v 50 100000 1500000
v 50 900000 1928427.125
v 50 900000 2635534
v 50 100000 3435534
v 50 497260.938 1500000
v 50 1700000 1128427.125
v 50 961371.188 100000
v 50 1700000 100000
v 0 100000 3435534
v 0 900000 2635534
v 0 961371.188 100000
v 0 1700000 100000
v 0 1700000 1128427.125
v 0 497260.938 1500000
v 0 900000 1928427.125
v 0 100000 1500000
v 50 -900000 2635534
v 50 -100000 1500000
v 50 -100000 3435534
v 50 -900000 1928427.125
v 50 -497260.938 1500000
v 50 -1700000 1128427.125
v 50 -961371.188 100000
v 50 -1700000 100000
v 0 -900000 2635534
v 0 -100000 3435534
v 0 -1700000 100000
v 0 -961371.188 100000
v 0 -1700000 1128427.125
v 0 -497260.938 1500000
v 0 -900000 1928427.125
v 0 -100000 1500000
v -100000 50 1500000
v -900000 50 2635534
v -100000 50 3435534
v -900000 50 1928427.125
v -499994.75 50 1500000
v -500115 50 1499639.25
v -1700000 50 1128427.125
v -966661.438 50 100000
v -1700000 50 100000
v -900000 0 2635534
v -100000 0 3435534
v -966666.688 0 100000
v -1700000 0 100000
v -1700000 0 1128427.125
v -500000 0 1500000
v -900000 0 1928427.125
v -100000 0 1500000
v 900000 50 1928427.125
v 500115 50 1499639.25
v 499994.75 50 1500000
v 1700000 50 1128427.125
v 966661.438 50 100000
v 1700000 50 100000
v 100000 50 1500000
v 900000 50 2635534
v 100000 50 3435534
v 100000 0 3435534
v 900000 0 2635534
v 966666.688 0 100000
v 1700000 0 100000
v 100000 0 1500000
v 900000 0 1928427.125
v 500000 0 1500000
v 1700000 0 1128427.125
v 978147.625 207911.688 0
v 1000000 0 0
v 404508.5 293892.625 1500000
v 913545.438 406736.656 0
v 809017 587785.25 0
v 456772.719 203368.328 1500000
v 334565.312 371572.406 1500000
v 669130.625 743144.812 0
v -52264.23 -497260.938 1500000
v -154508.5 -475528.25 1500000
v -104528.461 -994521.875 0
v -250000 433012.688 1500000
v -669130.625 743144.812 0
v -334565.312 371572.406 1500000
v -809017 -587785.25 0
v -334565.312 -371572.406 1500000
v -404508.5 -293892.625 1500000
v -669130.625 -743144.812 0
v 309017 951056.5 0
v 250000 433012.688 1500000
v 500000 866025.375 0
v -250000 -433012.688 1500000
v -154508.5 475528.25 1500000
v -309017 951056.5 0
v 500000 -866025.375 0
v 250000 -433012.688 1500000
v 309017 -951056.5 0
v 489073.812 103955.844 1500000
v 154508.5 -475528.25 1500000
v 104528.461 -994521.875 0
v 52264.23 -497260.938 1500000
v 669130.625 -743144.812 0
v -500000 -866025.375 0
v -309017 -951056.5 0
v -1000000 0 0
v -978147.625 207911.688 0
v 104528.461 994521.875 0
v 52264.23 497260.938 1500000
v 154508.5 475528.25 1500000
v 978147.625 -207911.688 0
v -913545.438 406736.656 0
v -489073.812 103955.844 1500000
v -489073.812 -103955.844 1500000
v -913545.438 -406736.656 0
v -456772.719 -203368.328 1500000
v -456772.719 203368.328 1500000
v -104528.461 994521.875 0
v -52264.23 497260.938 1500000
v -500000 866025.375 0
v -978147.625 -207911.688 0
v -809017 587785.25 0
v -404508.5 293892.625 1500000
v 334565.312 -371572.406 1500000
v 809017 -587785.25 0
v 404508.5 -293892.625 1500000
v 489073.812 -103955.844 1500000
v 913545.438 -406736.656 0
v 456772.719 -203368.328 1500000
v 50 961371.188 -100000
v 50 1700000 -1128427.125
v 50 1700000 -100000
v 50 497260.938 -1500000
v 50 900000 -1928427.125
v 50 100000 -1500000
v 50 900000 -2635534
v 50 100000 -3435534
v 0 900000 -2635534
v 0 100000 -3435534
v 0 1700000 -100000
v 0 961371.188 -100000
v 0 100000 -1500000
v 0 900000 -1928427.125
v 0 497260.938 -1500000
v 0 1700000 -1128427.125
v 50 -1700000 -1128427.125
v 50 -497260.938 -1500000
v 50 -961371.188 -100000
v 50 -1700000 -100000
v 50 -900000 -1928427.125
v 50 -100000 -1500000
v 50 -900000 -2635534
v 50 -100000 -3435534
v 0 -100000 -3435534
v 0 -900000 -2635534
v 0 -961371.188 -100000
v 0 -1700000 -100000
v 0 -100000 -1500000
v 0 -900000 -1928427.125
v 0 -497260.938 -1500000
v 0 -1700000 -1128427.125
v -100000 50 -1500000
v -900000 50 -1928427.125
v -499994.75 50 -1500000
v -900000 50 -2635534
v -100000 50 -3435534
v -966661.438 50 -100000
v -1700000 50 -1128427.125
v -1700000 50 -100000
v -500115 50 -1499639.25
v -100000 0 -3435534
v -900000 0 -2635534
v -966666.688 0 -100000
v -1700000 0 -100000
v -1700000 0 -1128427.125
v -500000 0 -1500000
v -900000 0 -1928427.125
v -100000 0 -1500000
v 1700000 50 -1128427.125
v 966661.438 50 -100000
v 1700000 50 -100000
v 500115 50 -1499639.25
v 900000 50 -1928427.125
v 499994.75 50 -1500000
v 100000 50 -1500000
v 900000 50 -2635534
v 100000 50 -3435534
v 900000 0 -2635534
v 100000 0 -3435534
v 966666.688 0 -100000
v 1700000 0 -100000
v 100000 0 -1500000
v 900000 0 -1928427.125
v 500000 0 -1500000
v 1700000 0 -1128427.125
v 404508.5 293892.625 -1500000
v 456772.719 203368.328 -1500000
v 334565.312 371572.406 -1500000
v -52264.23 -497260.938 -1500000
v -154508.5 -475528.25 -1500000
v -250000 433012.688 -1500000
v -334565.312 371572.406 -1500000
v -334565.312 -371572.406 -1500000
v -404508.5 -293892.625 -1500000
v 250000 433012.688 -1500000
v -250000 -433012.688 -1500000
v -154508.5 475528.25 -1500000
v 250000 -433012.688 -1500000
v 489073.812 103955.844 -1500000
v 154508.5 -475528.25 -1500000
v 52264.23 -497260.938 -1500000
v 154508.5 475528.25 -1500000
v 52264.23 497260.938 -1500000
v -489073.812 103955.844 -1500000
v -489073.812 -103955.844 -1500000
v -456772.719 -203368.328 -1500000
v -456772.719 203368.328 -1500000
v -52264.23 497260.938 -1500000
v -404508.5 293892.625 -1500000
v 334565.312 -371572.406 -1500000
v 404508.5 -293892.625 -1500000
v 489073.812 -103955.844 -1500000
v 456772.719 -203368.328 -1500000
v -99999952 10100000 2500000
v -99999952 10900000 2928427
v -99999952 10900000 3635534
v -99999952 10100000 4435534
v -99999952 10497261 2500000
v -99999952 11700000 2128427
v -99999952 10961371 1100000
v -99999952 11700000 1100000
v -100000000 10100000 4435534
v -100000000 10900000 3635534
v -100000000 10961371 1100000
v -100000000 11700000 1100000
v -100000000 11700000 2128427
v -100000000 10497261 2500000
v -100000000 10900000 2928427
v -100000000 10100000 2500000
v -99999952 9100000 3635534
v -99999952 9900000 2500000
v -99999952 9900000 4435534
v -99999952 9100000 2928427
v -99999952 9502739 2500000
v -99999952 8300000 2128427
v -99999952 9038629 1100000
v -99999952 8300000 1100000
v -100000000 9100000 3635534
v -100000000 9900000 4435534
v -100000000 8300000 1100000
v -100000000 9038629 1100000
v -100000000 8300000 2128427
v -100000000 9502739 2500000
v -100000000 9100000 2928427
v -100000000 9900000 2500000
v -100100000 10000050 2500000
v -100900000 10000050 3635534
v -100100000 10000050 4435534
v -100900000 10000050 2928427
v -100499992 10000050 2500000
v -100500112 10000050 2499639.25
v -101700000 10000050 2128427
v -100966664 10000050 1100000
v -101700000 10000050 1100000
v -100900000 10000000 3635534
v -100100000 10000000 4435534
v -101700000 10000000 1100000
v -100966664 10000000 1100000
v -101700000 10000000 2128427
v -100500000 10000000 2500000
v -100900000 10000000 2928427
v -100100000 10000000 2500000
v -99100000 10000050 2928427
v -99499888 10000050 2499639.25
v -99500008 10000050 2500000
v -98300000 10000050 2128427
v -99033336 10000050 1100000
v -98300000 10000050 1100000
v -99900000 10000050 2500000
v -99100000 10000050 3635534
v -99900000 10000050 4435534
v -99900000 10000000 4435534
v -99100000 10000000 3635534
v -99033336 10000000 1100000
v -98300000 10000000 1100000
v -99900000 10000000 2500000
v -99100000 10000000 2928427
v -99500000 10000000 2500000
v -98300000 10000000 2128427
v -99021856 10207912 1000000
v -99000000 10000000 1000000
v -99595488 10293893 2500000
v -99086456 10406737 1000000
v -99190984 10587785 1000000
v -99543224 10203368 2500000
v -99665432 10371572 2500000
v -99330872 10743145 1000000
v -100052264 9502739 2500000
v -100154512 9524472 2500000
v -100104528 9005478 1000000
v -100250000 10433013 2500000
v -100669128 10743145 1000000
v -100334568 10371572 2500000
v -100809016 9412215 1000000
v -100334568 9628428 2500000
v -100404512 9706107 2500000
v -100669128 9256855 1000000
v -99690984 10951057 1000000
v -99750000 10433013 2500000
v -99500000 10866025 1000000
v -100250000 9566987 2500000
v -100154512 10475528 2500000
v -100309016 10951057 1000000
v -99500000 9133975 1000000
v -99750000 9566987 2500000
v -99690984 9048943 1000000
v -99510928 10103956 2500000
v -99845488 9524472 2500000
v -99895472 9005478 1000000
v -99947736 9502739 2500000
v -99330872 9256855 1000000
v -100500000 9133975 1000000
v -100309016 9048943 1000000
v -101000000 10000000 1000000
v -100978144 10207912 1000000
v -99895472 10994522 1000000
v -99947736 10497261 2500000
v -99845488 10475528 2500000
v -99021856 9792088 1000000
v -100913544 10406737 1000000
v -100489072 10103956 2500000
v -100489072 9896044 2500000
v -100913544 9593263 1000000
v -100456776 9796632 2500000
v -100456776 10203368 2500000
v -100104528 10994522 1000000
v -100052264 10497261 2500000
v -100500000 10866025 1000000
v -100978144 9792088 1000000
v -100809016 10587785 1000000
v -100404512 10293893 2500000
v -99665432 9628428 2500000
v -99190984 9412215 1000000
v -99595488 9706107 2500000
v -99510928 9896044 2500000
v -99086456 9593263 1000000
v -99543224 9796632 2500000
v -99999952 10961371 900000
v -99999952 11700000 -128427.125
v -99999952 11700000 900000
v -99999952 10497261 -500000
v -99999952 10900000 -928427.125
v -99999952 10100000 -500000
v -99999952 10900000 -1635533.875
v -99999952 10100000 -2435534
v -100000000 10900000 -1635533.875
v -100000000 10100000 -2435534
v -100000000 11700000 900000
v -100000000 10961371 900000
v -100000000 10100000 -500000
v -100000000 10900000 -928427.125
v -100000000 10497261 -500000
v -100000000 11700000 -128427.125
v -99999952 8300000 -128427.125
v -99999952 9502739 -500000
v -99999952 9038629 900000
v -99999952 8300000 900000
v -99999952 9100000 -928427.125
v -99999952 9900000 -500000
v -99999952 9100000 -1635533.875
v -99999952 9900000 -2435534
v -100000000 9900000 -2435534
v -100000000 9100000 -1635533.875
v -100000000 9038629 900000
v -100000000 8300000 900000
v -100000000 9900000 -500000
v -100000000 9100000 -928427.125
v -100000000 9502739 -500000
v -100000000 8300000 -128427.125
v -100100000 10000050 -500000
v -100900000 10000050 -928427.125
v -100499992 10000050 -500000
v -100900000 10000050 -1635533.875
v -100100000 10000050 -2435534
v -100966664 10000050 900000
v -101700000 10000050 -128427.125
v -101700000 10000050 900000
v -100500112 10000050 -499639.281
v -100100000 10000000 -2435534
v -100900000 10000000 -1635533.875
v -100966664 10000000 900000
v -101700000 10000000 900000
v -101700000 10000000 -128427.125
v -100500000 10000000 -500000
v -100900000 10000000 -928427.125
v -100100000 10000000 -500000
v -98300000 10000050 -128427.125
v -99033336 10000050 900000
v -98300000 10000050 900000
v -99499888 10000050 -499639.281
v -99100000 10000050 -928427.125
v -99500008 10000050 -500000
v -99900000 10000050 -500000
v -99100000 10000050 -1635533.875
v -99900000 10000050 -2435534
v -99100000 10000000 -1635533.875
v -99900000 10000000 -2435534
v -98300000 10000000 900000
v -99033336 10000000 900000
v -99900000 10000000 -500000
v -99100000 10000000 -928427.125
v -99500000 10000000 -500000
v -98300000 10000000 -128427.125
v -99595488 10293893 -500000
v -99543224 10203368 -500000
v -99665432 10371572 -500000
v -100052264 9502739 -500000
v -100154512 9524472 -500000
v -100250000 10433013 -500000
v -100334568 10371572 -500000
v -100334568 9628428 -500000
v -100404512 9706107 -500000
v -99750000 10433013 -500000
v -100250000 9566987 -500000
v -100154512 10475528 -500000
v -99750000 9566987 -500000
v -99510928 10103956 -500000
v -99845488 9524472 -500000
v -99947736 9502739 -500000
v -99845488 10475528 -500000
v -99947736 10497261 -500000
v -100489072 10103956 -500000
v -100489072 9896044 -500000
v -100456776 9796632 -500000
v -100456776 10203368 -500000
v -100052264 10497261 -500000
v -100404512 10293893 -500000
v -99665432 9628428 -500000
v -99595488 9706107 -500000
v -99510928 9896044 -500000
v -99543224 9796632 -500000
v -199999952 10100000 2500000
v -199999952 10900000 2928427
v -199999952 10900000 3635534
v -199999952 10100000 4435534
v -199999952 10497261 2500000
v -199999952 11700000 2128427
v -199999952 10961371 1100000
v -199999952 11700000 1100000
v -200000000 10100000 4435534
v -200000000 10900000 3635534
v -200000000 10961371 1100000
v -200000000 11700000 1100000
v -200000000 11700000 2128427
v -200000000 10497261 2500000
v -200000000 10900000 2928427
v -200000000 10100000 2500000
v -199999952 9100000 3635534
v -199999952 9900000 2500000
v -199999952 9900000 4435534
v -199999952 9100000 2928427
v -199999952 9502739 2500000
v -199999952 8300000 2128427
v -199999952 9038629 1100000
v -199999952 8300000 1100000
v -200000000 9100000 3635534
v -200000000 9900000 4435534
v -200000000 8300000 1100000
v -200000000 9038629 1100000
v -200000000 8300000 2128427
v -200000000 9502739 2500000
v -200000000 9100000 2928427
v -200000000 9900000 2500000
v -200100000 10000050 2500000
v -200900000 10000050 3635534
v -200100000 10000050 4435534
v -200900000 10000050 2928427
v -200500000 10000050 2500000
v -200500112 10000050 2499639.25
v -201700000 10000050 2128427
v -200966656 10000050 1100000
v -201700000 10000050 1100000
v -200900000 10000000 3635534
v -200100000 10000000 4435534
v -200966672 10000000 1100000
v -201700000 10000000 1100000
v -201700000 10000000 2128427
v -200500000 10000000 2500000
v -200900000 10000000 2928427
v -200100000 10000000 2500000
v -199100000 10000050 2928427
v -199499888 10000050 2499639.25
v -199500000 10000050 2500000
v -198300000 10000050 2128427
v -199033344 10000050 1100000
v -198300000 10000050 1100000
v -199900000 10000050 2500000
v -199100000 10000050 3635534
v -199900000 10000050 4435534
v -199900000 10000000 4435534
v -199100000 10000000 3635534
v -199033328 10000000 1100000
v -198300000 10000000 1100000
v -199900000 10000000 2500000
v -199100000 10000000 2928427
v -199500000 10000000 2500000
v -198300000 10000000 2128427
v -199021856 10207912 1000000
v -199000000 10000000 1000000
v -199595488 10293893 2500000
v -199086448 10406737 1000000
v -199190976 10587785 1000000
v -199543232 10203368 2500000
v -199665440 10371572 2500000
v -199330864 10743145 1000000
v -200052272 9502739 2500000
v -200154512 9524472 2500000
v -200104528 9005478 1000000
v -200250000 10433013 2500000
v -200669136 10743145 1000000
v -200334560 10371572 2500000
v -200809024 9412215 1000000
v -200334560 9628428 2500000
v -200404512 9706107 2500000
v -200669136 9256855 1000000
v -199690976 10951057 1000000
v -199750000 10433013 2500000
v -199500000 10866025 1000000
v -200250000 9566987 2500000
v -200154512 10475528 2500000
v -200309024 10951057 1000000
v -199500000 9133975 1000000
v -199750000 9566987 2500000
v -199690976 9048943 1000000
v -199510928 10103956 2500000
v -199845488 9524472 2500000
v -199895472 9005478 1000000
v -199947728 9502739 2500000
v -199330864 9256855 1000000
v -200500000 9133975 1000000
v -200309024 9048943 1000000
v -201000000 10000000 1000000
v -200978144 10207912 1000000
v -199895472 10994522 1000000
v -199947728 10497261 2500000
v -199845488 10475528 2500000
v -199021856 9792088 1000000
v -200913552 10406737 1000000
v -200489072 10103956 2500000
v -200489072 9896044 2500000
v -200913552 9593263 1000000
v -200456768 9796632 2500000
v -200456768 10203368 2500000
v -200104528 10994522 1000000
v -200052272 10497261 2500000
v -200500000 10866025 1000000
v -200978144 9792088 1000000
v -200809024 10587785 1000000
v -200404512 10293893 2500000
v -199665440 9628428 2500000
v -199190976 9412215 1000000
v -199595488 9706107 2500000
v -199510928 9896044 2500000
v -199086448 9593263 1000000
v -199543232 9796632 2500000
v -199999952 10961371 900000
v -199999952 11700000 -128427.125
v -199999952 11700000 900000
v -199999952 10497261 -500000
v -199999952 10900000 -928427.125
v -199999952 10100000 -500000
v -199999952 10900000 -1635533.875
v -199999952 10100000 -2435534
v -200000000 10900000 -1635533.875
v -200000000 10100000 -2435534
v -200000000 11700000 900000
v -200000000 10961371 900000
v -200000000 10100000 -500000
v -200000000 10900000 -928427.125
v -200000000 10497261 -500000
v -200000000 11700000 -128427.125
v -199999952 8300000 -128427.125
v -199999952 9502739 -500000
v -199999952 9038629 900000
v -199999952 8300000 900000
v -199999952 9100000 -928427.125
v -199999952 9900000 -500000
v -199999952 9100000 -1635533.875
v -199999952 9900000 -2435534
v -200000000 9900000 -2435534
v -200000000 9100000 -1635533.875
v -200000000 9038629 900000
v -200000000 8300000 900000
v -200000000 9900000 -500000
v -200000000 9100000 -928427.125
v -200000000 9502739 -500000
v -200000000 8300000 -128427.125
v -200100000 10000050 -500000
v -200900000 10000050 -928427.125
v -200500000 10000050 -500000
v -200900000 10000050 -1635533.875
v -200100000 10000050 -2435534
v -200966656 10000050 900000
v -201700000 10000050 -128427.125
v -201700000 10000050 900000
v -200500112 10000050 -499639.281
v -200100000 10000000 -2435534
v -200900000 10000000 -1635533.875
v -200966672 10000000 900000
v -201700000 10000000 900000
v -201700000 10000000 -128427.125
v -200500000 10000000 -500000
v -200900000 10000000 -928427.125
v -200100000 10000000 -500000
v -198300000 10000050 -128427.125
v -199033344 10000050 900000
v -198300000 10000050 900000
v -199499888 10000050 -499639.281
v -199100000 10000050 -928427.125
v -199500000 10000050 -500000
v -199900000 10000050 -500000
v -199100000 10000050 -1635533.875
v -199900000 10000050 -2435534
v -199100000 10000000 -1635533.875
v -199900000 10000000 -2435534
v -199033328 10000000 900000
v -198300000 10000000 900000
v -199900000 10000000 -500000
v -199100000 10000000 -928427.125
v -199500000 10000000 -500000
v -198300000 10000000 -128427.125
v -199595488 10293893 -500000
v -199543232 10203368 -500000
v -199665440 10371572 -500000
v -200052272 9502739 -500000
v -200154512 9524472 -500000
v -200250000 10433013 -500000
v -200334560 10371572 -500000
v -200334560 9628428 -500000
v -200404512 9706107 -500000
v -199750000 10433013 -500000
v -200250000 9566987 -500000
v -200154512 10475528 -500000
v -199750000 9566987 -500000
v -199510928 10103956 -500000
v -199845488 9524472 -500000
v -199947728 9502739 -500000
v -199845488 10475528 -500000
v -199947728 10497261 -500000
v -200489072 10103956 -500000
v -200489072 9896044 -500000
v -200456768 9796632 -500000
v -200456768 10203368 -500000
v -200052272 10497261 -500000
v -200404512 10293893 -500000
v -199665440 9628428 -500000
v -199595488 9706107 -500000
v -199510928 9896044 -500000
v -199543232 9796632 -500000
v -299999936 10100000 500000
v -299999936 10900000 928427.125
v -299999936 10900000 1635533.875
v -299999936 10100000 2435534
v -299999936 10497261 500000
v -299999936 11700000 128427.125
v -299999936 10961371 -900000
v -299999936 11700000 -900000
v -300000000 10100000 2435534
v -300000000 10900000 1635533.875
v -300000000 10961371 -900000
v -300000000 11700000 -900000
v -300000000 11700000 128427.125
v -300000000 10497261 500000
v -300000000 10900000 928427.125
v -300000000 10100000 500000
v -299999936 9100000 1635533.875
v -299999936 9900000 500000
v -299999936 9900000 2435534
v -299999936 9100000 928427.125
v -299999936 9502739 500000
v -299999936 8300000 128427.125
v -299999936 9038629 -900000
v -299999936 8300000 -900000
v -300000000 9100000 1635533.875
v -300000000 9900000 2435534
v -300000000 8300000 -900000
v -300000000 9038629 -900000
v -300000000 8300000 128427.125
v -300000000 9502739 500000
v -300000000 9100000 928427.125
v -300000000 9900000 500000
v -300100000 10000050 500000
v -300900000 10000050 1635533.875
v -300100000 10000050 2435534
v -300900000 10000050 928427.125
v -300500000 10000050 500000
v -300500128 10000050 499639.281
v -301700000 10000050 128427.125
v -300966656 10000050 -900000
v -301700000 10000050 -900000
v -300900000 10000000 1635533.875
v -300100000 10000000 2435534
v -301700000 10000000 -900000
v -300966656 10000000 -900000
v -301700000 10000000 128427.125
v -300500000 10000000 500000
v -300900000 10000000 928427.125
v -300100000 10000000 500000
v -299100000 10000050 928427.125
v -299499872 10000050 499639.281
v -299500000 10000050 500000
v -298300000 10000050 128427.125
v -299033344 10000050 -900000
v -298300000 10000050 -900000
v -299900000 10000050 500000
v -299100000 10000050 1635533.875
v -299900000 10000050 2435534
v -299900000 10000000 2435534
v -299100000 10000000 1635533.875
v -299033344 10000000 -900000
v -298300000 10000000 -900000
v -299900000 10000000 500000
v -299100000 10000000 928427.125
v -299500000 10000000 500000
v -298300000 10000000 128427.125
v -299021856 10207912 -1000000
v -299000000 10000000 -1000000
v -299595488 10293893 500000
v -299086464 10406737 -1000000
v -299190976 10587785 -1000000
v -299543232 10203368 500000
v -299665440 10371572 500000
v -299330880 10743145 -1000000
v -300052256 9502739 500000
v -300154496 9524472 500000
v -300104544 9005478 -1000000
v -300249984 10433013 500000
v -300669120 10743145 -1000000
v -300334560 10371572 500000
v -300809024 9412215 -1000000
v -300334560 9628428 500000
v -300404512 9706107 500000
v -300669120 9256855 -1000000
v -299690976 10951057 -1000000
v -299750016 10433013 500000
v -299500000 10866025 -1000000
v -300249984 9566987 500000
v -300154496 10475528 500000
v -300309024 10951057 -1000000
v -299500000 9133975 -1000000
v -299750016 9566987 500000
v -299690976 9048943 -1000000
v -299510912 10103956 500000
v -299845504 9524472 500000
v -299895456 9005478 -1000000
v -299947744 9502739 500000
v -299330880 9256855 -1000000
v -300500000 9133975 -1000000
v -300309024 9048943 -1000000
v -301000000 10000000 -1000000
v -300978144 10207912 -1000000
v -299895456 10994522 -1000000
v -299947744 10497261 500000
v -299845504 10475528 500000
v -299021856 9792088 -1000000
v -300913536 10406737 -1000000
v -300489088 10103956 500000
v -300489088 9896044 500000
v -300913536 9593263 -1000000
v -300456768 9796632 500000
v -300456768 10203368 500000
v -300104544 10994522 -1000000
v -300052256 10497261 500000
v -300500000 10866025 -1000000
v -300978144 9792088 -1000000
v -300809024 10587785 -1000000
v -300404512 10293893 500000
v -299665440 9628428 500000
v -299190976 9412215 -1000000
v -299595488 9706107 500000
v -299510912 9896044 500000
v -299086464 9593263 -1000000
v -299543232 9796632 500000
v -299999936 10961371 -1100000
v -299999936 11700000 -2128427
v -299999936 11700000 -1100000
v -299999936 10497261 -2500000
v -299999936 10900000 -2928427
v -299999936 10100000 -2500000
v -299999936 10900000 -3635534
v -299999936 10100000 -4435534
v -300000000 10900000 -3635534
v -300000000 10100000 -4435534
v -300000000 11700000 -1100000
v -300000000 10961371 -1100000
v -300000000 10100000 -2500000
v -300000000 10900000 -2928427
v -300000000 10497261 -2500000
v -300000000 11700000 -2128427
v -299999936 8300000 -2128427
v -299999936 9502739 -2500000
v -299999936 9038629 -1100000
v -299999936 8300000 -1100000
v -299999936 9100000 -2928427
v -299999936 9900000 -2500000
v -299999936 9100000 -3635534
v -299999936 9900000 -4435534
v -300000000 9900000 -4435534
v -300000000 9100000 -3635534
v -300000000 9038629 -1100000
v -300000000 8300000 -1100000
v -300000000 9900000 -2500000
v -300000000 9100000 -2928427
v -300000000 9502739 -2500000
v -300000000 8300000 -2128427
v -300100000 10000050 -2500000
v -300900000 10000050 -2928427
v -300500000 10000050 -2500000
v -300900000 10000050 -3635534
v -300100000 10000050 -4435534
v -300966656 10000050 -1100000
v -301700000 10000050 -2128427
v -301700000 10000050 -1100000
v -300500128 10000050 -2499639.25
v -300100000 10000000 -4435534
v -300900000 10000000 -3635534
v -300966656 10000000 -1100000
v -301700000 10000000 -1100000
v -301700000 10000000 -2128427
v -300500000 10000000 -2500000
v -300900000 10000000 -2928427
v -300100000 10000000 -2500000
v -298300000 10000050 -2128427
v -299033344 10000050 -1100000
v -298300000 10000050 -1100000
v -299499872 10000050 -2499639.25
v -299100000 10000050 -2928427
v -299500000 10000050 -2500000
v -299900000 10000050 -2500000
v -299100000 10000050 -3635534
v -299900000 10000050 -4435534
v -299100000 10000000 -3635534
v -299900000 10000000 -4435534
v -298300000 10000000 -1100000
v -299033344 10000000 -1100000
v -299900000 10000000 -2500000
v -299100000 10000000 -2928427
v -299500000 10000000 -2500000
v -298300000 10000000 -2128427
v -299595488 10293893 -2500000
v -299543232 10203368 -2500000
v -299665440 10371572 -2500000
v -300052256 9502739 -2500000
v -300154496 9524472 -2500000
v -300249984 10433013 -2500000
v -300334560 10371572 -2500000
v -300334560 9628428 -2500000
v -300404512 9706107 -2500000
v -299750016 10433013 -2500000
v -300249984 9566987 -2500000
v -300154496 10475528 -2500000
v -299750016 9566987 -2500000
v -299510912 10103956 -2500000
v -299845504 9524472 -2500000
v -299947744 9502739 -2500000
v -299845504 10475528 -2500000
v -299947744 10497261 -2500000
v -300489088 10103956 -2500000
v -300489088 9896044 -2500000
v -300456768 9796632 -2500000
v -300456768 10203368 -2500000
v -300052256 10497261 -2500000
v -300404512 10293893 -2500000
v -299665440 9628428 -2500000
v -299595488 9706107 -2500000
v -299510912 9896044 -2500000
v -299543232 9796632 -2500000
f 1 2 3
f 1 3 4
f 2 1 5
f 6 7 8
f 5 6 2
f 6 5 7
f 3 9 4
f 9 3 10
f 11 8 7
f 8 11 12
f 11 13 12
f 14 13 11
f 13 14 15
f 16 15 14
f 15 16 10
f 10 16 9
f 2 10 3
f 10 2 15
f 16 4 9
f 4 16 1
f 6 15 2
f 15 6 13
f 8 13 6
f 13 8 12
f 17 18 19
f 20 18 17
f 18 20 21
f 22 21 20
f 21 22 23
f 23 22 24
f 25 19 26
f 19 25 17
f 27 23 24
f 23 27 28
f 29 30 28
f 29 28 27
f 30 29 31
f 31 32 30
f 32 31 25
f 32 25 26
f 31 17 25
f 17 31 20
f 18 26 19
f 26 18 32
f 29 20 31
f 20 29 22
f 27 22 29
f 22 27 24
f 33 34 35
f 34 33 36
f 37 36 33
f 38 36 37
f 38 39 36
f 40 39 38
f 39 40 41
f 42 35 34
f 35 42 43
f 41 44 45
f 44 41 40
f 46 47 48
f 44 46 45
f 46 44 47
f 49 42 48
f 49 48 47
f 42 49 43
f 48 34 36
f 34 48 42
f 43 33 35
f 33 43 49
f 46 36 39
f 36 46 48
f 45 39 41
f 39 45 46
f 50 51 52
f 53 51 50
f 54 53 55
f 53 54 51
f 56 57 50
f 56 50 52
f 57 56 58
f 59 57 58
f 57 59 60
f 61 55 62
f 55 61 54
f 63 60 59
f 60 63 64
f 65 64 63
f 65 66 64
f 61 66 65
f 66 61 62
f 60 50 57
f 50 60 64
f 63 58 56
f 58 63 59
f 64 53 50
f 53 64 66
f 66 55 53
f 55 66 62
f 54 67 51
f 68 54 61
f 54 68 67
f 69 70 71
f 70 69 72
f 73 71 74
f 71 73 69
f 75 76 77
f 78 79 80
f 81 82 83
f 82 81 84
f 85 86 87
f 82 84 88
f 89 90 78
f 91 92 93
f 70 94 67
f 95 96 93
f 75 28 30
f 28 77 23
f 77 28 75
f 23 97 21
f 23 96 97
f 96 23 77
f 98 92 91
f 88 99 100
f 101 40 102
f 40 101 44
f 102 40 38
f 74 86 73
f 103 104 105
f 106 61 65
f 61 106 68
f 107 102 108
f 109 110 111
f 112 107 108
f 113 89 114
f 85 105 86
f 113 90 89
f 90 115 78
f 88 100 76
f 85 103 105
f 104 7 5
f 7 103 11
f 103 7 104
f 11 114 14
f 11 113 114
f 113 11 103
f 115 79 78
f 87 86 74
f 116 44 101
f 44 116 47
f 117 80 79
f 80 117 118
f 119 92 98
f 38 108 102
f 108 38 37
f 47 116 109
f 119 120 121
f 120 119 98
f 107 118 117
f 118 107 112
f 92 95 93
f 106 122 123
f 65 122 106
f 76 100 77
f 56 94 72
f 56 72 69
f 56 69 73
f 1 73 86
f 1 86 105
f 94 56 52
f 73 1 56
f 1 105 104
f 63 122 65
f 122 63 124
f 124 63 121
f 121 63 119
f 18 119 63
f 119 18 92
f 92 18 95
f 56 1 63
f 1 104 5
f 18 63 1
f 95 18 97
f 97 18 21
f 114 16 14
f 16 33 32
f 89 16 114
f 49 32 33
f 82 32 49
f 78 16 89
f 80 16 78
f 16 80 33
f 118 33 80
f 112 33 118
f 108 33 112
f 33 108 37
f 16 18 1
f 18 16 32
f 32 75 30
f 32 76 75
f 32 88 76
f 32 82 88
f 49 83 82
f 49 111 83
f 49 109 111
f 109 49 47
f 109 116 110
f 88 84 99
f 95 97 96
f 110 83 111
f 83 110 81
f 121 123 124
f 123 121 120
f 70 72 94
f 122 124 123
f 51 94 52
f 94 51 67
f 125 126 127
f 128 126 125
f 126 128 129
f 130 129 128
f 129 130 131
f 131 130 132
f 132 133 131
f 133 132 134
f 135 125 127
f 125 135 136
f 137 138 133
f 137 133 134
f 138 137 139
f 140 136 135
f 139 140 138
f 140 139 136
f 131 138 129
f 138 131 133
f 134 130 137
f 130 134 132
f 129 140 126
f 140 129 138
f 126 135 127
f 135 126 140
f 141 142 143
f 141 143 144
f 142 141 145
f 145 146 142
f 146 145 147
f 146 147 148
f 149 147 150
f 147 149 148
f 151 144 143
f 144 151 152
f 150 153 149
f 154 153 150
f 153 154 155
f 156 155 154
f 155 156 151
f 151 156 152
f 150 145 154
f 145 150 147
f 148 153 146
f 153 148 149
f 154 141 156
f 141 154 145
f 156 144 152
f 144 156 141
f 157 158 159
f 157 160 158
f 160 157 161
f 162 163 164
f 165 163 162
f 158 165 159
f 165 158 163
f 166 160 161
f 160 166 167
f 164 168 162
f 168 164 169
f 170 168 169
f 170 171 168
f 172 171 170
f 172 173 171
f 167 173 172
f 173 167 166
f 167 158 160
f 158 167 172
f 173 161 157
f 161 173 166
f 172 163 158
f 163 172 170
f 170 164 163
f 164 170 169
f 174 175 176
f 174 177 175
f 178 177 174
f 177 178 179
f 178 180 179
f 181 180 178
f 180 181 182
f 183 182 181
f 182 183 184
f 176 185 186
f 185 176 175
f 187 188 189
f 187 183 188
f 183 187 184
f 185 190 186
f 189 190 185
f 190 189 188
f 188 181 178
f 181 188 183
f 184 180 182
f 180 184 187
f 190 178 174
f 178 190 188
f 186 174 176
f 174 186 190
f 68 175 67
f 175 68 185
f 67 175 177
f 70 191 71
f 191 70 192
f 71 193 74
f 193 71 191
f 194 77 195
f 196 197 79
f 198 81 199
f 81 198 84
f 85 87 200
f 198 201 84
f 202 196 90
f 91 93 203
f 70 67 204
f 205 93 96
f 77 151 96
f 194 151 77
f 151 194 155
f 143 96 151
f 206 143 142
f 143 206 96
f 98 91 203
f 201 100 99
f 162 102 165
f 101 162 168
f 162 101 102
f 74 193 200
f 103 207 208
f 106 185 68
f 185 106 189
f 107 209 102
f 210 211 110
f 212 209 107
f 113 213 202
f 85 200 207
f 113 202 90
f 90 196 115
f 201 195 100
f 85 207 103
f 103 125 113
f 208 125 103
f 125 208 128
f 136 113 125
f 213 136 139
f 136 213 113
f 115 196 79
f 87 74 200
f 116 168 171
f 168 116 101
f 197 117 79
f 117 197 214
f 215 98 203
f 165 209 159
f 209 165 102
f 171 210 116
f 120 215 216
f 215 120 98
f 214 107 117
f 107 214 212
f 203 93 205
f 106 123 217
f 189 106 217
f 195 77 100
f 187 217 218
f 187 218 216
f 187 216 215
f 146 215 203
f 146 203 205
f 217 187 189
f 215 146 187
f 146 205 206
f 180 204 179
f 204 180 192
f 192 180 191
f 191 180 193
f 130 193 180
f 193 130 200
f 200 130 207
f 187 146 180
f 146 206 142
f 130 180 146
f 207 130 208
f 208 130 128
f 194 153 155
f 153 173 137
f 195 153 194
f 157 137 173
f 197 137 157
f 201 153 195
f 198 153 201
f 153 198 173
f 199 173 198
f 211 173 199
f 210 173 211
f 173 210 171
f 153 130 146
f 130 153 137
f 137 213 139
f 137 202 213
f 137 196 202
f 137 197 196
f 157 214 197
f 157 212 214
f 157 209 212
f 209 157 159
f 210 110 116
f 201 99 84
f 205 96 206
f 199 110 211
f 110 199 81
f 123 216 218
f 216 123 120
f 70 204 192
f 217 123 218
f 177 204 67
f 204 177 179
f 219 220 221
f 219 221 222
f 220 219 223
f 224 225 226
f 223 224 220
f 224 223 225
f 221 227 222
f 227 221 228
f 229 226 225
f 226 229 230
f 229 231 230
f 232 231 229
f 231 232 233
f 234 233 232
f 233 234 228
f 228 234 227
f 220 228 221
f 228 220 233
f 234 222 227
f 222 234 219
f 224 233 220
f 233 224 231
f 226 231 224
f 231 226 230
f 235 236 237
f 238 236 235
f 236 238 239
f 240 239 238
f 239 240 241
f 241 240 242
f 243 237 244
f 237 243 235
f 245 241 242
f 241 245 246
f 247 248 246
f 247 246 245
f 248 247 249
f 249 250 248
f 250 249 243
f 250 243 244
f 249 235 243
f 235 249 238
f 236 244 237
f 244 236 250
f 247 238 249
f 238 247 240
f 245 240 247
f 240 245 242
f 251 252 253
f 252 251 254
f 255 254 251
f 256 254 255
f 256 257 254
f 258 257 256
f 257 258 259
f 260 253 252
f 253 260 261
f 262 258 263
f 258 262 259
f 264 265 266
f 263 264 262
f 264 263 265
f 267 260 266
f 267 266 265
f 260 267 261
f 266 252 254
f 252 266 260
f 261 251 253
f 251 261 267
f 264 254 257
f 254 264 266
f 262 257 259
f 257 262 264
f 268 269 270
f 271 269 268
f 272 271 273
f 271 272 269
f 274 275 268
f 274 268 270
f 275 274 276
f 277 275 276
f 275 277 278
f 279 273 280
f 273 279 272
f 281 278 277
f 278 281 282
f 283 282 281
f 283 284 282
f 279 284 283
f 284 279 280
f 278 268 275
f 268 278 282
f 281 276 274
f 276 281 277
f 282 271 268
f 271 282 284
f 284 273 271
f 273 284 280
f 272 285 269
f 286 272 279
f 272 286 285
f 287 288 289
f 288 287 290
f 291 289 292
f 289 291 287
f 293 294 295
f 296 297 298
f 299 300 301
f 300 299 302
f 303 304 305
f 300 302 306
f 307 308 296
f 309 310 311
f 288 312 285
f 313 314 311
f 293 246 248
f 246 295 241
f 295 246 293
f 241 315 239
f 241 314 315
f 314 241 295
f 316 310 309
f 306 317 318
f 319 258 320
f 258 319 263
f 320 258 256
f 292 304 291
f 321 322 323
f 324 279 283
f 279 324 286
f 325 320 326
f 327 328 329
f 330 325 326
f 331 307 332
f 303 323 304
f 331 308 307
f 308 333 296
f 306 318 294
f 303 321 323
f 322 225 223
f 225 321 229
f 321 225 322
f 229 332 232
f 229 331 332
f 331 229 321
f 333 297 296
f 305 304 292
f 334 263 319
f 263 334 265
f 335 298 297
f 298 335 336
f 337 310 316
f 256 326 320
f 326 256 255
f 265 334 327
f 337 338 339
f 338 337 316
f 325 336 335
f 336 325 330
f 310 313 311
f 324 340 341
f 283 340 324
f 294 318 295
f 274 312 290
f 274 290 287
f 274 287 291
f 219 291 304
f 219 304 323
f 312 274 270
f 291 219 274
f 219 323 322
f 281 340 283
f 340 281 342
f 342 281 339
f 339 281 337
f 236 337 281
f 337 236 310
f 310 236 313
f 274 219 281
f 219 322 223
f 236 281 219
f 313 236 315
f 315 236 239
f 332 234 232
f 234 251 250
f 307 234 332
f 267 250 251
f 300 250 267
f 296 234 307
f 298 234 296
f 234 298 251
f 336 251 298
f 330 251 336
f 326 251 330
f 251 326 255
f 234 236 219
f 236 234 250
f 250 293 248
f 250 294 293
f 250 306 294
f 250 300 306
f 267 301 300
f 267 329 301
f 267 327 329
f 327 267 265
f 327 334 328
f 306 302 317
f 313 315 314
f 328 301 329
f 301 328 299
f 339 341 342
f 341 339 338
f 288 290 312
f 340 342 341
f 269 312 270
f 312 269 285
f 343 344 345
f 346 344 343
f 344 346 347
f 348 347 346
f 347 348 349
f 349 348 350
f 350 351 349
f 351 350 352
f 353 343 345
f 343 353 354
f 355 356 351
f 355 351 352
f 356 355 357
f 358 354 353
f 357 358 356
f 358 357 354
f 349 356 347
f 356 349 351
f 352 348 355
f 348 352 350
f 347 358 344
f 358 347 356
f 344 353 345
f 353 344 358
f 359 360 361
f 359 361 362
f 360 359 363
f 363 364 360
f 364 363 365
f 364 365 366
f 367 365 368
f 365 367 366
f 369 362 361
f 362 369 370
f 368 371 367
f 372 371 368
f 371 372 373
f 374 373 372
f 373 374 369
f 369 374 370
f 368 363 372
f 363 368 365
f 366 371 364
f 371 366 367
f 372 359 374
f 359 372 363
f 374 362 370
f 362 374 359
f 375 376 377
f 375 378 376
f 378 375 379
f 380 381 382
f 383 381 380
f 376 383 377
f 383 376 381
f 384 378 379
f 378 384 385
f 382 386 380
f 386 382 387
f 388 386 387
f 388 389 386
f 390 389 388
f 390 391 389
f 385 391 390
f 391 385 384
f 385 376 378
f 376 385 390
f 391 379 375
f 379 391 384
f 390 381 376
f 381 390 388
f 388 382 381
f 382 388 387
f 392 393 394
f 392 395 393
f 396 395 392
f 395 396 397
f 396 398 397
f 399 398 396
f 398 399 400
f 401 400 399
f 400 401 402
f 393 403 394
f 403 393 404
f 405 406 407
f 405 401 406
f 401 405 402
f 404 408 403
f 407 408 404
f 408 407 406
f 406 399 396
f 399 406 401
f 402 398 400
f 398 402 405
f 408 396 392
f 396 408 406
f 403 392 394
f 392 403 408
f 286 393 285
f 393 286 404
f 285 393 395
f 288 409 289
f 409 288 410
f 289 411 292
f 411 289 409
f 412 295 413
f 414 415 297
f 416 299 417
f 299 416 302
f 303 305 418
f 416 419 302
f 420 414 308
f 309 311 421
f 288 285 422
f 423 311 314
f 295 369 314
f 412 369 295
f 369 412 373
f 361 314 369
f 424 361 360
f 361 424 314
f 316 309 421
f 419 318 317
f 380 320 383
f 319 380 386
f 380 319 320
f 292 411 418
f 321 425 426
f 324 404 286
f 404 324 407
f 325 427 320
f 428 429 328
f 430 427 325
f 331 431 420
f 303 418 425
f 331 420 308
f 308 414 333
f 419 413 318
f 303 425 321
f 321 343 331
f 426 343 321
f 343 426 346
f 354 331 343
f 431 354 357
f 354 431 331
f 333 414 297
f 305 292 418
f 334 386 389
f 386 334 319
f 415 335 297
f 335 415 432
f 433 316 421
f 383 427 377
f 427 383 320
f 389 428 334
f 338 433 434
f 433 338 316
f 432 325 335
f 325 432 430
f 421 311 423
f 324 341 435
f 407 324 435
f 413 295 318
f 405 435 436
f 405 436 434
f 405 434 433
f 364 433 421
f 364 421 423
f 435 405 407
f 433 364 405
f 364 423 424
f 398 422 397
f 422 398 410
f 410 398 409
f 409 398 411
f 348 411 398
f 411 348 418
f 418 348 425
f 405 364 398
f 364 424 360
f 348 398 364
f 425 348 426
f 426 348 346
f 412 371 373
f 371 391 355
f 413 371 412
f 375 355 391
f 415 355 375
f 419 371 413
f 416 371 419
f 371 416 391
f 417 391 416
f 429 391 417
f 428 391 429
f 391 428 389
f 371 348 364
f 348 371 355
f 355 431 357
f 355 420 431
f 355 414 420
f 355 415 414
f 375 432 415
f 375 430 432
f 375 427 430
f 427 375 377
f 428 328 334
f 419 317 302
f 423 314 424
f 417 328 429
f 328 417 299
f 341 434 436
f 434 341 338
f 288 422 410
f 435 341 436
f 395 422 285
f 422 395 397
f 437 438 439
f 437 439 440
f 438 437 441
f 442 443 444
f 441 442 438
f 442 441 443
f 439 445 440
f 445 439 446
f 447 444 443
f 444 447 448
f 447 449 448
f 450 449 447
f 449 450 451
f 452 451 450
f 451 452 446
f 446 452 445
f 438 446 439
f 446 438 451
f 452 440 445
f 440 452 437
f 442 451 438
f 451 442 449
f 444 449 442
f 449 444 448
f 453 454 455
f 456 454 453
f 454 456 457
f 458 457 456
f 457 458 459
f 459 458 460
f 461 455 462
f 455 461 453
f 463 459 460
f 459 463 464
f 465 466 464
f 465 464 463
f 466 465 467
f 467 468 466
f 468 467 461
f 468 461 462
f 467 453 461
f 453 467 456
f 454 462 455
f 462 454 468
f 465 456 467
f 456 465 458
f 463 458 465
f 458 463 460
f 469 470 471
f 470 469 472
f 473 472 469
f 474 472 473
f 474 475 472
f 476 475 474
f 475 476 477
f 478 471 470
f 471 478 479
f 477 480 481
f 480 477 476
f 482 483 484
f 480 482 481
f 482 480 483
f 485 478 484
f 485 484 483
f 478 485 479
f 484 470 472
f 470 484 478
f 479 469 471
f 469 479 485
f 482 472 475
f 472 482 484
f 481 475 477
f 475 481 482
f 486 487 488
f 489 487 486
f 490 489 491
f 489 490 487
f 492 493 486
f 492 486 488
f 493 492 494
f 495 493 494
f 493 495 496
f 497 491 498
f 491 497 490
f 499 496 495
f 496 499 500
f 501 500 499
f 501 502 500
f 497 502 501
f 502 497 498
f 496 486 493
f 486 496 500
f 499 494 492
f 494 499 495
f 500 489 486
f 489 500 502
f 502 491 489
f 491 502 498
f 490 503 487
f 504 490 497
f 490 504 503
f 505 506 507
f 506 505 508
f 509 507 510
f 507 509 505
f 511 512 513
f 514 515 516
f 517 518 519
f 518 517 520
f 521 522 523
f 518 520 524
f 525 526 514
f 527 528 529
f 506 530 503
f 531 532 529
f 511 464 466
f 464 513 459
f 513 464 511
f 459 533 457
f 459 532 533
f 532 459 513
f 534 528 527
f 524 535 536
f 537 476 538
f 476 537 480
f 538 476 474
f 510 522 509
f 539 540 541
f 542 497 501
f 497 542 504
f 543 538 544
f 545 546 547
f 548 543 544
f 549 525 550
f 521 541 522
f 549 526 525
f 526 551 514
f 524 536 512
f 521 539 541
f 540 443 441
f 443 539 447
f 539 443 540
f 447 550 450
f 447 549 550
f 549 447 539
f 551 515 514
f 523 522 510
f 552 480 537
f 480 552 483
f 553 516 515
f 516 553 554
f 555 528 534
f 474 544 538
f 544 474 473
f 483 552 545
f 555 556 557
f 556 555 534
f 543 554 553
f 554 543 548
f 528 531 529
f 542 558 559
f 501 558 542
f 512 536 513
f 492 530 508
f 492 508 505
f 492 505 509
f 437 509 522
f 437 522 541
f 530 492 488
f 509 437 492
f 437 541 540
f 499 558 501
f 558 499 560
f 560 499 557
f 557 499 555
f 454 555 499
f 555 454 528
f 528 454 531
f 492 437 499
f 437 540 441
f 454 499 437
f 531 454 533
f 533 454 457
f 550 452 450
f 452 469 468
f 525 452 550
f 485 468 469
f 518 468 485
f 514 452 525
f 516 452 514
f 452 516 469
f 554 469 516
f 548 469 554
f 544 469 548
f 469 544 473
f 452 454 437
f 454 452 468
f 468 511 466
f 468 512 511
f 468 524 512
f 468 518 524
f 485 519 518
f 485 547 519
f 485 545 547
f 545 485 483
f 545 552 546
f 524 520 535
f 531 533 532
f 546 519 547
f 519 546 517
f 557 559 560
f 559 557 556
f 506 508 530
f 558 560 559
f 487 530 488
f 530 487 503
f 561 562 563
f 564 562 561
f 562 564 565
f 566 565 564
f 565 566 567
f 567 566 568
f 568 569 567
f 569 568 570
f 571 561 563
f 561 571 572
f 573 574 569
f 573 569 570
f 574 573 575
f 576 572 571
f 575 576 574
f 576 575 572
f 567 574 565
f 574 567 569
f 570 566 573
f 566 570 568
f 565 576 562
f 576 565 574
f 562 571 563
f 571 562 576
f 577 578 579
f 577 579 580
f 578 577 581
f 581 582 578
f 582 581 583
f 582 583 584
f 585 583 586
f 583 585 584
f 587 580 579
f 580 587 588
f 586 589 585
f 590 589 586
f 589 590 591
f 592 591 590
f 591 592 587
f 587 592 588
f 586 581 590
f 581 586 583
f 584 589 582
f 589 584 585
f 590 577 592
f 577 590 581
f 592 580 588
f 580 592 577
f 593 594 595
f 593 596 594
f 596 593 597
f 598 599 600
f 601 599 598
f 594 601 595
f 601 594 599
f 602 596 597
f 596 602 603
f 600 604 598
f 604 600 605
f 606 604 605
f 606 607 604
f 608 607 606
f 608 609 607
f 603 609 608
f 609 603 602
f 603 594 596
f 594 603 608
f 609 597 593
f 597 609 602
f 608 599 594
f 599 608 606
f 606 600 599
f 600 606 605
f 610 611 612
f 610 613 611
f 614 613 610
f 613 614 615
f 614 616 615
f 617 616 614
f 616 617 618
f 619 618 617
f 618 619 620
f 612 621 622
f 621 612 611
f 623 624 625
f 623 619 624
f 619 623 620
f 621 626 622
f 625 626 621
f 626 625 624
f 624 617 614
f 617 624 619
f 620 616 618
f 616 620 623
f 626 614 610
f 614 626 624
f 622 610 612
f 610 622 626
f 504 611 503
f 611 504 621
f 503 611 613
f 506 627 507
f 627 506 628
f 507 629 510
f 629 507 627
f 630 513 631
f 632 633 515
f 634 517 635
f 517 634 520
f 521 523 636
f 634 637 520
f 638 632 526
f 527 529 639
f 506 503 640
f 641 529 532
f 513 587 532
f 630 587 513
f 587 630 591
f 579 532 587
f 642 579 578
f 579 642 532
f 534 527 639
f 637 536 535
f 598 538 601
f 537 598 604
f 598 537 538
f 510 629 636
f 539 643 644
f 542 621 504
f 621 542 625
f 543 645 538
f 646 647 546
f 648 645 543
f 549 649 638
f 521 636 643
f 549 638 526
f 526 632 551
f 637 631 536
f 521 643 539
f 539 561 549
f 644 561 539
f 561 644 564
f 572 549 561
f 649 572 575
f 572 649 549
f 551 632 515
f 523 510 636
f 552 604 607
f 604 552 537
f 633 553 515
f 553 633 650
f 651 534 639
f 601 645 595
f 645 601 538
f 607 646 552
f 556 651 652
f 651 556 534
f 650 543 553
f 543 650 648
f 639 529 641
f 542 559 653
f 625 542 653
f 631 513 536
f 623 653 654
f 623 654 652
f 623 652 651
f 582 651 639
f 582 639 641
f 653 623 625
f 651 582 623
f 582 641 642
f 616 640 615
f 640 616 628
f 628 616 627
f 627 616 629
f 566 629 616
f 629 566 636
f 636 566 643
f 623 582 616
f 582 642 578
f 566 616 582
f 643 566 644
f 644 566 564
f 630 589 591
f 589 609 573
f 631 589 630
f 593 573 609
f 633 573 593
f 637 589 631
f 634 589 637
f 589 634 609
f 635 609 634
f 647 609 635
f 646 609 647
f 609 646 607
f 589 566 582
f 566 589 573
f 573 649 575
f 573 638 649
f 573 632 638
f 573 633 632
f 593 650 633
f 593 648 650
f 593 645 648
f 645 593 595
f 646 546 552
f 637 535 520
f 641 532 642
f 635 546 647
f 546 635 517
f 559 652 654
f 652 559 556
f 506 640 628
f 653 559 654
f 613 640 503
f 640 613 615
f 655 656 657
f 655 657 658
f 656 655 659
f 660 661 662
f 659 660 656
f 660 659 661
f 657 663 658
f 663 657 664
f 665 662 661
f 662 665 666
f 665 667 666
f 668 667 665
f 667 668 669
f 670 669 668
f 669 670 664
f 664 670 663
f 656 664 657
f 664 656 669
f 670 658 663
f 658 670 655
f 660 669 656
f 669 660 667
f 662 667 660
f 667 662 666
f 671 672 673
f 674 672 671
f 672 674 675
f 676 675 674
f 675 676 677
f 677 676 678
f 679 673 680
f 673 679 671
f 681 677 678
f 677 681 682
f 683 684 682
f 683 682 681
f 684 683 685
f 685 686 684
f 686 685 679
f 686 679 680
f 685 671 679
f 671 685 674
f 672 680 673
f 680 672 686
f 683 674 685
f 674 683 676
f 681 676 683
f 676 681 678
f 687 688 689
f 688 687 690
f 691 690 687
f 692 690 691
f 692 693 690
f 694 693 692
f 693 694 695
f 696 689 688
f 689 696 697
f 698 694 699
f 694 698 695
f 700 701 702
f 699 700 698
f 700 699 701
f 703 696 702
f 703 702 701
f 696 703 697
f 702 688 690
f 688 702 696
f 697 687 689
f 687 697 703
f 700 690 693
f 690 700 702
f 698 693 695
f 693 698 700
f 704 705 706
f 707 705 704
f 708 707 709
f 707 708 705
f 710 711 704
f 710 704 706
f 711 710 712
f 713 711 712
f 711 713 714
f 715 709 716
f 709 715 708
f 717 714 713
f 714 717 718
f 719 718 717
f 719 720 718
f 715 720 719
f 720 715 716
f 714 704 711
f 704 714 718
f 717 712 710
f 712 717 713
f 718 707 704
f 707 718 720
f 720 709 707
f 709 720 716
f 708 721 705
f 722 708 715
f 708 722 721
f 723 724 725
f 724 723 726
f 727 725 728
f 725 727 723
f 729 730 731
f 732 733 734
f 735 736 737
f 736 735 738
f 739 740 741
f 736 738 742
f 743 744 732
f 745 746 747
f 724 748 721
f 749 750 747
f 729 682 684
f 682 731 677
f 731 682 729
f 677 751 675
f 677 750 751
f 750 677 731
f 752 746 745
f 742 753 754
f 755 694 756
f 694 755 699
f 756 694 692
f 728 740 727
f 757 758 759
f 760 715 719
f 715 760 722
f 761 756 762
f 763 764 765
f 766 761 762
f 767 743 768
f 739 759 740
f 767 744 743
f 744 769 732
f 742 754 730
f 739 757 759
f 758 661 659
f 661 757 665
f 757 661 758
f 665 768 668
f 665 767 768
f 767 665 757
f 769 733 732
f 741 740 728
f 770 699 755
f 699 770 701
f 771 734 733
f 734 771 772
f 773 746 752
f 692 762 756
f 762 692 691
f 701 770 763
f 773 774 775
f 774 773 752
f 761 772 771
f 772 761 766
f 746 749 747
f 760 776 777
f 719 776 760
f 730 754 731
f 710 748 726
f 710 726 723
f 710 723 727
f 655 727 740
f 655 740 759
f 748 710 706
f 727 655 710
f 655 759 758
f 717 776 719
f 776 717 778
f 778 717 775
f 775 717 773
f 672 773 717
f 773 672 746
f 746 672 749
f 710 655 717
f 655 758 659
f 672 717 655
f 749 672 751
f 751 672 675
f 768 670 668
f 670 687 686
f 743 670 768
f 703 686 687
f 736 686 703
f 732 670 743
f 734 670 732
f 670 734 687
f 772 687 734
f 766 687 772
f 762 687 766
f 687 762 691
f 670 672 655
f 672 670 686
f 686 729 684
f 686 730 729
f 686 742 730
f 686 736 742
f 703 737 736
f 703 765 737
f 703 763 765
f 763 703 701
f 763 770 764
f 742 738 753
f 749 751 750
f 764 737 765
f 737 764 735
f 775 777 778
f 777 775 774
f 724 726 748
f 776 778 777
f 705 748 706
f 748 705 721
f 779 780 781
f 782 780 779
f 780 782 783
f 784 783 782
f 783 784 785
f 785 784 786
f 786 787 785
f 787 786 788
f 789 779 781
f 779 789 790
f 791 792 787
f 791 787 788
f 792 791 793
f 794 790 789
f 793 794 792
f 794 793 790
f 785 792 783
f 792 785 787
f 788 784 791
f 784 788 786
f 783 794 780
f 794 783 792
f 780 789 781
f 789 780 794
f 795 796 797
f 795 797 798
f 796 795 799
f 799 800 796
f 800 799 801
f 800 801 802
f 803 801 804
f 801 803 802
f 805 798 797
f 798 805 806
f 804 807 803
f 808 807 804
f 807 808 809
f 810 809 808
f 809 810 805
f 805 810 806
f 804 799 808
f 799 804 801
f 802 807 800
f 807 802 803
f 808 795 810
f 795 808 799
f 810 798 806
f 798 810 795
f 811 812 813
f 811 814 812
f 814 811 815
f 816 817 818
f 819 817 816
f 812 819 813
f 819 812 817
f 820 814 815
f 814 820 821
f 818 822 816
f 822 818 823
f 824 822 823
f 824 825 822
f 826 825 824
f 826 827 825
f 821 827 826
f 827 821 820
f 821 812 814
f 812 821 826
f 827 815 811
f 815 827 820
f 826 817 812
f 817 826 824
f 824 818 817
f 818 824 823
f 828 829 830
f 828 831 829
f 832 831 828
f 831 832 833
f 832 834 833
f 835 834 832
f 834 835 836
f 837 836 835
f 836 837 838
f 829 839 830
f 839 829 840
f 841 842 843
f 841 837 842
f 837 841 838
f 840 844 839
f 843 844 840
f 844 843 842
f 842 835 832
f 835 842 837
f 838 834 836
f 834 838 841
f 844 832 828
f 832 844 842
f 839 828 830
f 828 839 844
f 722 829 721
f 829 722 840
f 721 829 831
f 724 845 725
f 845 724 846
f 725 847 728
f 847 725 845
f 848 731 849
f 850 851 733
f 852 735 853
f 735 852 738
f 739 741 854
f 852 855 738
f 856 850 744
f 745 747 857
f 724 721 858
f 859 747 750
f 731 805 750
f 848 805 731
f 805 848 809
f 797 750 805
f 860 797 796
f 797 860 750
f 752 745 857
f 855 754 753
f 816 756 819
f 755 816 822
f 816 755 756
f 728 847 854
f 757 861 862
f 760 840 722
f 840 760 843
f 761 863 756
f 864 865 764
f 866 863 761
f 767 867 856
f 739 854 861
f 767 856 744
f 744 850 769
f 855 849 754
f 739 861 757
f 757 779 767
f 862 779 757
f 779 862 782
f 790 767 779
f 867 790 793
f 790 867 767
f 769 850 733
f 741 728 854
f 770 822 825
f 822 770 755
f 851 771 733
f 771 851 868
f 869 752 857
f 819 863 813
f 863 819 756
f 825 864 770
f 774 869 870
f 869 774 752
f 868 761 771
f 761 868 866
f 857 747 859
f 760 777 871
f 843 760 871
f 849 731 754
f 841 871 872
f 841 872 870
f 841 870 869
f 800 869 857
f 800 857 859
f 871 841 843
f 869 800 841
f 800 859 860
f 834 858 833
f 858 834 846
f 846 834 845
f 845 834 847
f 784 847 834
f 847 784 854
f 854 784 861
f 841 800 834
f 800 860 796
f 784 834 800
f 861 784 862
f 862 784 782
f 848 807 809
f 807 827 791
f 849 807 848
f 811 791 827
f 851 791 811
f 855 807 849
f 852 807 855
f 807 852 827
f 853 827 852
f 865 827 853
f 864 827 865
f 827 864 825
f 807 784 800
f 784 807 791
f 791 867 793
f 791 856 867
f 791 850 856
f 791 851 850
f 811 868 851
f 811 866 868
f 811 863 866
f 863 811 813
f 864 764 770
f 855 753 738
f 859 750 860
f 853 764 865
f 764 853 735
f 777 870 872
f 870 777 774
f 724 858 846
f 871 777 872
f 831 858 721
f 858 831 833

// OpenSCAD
//cube([100, 50e3, 500e3]);

//cube(1e6,true);

module side(){
    union(){
        intersection(){
            rotate([45,0,0]){cube([100,5e6,5e6],true);}
            translate([0,0.1e6,0.1e6]){cube([100,0.8e6,5e6]);}
        }
        intersection(){
            rotate([45,0,0]){cube([100,4e6,4e6],true);}
            translate([0,0.9e6,0.1e6]){cube([100,0.8e6,5e6]);}
        }
    }
}

module bodyhalf(){
    union(){
        color([0.8,0.8,0.8]){cylinder(r1=1e6,r2=0.5e6,h=1.5e6);}
        color([0.2,0.3,0.5]){
            side();
            scale([1,-1,1]){side();}
        }
        color([0.4,0.2,0.1]){rotate([0,0,90]){
            side();
            scale([1,-1,1]){side();}
        }}
    }
}

module body(){
    union(){
        bodyhalf();
        scale([1,1,-1]){bodyhalf();}
    }
}

body();
translate([-1e8,1e7,1e6]){body();}
translate([-2e8,1e7,1e6]){body();}
translate([-3e8,1e7,-1e6]){body();}

$vpr=[87.2,0,77.5];
$vpd=3e7;
